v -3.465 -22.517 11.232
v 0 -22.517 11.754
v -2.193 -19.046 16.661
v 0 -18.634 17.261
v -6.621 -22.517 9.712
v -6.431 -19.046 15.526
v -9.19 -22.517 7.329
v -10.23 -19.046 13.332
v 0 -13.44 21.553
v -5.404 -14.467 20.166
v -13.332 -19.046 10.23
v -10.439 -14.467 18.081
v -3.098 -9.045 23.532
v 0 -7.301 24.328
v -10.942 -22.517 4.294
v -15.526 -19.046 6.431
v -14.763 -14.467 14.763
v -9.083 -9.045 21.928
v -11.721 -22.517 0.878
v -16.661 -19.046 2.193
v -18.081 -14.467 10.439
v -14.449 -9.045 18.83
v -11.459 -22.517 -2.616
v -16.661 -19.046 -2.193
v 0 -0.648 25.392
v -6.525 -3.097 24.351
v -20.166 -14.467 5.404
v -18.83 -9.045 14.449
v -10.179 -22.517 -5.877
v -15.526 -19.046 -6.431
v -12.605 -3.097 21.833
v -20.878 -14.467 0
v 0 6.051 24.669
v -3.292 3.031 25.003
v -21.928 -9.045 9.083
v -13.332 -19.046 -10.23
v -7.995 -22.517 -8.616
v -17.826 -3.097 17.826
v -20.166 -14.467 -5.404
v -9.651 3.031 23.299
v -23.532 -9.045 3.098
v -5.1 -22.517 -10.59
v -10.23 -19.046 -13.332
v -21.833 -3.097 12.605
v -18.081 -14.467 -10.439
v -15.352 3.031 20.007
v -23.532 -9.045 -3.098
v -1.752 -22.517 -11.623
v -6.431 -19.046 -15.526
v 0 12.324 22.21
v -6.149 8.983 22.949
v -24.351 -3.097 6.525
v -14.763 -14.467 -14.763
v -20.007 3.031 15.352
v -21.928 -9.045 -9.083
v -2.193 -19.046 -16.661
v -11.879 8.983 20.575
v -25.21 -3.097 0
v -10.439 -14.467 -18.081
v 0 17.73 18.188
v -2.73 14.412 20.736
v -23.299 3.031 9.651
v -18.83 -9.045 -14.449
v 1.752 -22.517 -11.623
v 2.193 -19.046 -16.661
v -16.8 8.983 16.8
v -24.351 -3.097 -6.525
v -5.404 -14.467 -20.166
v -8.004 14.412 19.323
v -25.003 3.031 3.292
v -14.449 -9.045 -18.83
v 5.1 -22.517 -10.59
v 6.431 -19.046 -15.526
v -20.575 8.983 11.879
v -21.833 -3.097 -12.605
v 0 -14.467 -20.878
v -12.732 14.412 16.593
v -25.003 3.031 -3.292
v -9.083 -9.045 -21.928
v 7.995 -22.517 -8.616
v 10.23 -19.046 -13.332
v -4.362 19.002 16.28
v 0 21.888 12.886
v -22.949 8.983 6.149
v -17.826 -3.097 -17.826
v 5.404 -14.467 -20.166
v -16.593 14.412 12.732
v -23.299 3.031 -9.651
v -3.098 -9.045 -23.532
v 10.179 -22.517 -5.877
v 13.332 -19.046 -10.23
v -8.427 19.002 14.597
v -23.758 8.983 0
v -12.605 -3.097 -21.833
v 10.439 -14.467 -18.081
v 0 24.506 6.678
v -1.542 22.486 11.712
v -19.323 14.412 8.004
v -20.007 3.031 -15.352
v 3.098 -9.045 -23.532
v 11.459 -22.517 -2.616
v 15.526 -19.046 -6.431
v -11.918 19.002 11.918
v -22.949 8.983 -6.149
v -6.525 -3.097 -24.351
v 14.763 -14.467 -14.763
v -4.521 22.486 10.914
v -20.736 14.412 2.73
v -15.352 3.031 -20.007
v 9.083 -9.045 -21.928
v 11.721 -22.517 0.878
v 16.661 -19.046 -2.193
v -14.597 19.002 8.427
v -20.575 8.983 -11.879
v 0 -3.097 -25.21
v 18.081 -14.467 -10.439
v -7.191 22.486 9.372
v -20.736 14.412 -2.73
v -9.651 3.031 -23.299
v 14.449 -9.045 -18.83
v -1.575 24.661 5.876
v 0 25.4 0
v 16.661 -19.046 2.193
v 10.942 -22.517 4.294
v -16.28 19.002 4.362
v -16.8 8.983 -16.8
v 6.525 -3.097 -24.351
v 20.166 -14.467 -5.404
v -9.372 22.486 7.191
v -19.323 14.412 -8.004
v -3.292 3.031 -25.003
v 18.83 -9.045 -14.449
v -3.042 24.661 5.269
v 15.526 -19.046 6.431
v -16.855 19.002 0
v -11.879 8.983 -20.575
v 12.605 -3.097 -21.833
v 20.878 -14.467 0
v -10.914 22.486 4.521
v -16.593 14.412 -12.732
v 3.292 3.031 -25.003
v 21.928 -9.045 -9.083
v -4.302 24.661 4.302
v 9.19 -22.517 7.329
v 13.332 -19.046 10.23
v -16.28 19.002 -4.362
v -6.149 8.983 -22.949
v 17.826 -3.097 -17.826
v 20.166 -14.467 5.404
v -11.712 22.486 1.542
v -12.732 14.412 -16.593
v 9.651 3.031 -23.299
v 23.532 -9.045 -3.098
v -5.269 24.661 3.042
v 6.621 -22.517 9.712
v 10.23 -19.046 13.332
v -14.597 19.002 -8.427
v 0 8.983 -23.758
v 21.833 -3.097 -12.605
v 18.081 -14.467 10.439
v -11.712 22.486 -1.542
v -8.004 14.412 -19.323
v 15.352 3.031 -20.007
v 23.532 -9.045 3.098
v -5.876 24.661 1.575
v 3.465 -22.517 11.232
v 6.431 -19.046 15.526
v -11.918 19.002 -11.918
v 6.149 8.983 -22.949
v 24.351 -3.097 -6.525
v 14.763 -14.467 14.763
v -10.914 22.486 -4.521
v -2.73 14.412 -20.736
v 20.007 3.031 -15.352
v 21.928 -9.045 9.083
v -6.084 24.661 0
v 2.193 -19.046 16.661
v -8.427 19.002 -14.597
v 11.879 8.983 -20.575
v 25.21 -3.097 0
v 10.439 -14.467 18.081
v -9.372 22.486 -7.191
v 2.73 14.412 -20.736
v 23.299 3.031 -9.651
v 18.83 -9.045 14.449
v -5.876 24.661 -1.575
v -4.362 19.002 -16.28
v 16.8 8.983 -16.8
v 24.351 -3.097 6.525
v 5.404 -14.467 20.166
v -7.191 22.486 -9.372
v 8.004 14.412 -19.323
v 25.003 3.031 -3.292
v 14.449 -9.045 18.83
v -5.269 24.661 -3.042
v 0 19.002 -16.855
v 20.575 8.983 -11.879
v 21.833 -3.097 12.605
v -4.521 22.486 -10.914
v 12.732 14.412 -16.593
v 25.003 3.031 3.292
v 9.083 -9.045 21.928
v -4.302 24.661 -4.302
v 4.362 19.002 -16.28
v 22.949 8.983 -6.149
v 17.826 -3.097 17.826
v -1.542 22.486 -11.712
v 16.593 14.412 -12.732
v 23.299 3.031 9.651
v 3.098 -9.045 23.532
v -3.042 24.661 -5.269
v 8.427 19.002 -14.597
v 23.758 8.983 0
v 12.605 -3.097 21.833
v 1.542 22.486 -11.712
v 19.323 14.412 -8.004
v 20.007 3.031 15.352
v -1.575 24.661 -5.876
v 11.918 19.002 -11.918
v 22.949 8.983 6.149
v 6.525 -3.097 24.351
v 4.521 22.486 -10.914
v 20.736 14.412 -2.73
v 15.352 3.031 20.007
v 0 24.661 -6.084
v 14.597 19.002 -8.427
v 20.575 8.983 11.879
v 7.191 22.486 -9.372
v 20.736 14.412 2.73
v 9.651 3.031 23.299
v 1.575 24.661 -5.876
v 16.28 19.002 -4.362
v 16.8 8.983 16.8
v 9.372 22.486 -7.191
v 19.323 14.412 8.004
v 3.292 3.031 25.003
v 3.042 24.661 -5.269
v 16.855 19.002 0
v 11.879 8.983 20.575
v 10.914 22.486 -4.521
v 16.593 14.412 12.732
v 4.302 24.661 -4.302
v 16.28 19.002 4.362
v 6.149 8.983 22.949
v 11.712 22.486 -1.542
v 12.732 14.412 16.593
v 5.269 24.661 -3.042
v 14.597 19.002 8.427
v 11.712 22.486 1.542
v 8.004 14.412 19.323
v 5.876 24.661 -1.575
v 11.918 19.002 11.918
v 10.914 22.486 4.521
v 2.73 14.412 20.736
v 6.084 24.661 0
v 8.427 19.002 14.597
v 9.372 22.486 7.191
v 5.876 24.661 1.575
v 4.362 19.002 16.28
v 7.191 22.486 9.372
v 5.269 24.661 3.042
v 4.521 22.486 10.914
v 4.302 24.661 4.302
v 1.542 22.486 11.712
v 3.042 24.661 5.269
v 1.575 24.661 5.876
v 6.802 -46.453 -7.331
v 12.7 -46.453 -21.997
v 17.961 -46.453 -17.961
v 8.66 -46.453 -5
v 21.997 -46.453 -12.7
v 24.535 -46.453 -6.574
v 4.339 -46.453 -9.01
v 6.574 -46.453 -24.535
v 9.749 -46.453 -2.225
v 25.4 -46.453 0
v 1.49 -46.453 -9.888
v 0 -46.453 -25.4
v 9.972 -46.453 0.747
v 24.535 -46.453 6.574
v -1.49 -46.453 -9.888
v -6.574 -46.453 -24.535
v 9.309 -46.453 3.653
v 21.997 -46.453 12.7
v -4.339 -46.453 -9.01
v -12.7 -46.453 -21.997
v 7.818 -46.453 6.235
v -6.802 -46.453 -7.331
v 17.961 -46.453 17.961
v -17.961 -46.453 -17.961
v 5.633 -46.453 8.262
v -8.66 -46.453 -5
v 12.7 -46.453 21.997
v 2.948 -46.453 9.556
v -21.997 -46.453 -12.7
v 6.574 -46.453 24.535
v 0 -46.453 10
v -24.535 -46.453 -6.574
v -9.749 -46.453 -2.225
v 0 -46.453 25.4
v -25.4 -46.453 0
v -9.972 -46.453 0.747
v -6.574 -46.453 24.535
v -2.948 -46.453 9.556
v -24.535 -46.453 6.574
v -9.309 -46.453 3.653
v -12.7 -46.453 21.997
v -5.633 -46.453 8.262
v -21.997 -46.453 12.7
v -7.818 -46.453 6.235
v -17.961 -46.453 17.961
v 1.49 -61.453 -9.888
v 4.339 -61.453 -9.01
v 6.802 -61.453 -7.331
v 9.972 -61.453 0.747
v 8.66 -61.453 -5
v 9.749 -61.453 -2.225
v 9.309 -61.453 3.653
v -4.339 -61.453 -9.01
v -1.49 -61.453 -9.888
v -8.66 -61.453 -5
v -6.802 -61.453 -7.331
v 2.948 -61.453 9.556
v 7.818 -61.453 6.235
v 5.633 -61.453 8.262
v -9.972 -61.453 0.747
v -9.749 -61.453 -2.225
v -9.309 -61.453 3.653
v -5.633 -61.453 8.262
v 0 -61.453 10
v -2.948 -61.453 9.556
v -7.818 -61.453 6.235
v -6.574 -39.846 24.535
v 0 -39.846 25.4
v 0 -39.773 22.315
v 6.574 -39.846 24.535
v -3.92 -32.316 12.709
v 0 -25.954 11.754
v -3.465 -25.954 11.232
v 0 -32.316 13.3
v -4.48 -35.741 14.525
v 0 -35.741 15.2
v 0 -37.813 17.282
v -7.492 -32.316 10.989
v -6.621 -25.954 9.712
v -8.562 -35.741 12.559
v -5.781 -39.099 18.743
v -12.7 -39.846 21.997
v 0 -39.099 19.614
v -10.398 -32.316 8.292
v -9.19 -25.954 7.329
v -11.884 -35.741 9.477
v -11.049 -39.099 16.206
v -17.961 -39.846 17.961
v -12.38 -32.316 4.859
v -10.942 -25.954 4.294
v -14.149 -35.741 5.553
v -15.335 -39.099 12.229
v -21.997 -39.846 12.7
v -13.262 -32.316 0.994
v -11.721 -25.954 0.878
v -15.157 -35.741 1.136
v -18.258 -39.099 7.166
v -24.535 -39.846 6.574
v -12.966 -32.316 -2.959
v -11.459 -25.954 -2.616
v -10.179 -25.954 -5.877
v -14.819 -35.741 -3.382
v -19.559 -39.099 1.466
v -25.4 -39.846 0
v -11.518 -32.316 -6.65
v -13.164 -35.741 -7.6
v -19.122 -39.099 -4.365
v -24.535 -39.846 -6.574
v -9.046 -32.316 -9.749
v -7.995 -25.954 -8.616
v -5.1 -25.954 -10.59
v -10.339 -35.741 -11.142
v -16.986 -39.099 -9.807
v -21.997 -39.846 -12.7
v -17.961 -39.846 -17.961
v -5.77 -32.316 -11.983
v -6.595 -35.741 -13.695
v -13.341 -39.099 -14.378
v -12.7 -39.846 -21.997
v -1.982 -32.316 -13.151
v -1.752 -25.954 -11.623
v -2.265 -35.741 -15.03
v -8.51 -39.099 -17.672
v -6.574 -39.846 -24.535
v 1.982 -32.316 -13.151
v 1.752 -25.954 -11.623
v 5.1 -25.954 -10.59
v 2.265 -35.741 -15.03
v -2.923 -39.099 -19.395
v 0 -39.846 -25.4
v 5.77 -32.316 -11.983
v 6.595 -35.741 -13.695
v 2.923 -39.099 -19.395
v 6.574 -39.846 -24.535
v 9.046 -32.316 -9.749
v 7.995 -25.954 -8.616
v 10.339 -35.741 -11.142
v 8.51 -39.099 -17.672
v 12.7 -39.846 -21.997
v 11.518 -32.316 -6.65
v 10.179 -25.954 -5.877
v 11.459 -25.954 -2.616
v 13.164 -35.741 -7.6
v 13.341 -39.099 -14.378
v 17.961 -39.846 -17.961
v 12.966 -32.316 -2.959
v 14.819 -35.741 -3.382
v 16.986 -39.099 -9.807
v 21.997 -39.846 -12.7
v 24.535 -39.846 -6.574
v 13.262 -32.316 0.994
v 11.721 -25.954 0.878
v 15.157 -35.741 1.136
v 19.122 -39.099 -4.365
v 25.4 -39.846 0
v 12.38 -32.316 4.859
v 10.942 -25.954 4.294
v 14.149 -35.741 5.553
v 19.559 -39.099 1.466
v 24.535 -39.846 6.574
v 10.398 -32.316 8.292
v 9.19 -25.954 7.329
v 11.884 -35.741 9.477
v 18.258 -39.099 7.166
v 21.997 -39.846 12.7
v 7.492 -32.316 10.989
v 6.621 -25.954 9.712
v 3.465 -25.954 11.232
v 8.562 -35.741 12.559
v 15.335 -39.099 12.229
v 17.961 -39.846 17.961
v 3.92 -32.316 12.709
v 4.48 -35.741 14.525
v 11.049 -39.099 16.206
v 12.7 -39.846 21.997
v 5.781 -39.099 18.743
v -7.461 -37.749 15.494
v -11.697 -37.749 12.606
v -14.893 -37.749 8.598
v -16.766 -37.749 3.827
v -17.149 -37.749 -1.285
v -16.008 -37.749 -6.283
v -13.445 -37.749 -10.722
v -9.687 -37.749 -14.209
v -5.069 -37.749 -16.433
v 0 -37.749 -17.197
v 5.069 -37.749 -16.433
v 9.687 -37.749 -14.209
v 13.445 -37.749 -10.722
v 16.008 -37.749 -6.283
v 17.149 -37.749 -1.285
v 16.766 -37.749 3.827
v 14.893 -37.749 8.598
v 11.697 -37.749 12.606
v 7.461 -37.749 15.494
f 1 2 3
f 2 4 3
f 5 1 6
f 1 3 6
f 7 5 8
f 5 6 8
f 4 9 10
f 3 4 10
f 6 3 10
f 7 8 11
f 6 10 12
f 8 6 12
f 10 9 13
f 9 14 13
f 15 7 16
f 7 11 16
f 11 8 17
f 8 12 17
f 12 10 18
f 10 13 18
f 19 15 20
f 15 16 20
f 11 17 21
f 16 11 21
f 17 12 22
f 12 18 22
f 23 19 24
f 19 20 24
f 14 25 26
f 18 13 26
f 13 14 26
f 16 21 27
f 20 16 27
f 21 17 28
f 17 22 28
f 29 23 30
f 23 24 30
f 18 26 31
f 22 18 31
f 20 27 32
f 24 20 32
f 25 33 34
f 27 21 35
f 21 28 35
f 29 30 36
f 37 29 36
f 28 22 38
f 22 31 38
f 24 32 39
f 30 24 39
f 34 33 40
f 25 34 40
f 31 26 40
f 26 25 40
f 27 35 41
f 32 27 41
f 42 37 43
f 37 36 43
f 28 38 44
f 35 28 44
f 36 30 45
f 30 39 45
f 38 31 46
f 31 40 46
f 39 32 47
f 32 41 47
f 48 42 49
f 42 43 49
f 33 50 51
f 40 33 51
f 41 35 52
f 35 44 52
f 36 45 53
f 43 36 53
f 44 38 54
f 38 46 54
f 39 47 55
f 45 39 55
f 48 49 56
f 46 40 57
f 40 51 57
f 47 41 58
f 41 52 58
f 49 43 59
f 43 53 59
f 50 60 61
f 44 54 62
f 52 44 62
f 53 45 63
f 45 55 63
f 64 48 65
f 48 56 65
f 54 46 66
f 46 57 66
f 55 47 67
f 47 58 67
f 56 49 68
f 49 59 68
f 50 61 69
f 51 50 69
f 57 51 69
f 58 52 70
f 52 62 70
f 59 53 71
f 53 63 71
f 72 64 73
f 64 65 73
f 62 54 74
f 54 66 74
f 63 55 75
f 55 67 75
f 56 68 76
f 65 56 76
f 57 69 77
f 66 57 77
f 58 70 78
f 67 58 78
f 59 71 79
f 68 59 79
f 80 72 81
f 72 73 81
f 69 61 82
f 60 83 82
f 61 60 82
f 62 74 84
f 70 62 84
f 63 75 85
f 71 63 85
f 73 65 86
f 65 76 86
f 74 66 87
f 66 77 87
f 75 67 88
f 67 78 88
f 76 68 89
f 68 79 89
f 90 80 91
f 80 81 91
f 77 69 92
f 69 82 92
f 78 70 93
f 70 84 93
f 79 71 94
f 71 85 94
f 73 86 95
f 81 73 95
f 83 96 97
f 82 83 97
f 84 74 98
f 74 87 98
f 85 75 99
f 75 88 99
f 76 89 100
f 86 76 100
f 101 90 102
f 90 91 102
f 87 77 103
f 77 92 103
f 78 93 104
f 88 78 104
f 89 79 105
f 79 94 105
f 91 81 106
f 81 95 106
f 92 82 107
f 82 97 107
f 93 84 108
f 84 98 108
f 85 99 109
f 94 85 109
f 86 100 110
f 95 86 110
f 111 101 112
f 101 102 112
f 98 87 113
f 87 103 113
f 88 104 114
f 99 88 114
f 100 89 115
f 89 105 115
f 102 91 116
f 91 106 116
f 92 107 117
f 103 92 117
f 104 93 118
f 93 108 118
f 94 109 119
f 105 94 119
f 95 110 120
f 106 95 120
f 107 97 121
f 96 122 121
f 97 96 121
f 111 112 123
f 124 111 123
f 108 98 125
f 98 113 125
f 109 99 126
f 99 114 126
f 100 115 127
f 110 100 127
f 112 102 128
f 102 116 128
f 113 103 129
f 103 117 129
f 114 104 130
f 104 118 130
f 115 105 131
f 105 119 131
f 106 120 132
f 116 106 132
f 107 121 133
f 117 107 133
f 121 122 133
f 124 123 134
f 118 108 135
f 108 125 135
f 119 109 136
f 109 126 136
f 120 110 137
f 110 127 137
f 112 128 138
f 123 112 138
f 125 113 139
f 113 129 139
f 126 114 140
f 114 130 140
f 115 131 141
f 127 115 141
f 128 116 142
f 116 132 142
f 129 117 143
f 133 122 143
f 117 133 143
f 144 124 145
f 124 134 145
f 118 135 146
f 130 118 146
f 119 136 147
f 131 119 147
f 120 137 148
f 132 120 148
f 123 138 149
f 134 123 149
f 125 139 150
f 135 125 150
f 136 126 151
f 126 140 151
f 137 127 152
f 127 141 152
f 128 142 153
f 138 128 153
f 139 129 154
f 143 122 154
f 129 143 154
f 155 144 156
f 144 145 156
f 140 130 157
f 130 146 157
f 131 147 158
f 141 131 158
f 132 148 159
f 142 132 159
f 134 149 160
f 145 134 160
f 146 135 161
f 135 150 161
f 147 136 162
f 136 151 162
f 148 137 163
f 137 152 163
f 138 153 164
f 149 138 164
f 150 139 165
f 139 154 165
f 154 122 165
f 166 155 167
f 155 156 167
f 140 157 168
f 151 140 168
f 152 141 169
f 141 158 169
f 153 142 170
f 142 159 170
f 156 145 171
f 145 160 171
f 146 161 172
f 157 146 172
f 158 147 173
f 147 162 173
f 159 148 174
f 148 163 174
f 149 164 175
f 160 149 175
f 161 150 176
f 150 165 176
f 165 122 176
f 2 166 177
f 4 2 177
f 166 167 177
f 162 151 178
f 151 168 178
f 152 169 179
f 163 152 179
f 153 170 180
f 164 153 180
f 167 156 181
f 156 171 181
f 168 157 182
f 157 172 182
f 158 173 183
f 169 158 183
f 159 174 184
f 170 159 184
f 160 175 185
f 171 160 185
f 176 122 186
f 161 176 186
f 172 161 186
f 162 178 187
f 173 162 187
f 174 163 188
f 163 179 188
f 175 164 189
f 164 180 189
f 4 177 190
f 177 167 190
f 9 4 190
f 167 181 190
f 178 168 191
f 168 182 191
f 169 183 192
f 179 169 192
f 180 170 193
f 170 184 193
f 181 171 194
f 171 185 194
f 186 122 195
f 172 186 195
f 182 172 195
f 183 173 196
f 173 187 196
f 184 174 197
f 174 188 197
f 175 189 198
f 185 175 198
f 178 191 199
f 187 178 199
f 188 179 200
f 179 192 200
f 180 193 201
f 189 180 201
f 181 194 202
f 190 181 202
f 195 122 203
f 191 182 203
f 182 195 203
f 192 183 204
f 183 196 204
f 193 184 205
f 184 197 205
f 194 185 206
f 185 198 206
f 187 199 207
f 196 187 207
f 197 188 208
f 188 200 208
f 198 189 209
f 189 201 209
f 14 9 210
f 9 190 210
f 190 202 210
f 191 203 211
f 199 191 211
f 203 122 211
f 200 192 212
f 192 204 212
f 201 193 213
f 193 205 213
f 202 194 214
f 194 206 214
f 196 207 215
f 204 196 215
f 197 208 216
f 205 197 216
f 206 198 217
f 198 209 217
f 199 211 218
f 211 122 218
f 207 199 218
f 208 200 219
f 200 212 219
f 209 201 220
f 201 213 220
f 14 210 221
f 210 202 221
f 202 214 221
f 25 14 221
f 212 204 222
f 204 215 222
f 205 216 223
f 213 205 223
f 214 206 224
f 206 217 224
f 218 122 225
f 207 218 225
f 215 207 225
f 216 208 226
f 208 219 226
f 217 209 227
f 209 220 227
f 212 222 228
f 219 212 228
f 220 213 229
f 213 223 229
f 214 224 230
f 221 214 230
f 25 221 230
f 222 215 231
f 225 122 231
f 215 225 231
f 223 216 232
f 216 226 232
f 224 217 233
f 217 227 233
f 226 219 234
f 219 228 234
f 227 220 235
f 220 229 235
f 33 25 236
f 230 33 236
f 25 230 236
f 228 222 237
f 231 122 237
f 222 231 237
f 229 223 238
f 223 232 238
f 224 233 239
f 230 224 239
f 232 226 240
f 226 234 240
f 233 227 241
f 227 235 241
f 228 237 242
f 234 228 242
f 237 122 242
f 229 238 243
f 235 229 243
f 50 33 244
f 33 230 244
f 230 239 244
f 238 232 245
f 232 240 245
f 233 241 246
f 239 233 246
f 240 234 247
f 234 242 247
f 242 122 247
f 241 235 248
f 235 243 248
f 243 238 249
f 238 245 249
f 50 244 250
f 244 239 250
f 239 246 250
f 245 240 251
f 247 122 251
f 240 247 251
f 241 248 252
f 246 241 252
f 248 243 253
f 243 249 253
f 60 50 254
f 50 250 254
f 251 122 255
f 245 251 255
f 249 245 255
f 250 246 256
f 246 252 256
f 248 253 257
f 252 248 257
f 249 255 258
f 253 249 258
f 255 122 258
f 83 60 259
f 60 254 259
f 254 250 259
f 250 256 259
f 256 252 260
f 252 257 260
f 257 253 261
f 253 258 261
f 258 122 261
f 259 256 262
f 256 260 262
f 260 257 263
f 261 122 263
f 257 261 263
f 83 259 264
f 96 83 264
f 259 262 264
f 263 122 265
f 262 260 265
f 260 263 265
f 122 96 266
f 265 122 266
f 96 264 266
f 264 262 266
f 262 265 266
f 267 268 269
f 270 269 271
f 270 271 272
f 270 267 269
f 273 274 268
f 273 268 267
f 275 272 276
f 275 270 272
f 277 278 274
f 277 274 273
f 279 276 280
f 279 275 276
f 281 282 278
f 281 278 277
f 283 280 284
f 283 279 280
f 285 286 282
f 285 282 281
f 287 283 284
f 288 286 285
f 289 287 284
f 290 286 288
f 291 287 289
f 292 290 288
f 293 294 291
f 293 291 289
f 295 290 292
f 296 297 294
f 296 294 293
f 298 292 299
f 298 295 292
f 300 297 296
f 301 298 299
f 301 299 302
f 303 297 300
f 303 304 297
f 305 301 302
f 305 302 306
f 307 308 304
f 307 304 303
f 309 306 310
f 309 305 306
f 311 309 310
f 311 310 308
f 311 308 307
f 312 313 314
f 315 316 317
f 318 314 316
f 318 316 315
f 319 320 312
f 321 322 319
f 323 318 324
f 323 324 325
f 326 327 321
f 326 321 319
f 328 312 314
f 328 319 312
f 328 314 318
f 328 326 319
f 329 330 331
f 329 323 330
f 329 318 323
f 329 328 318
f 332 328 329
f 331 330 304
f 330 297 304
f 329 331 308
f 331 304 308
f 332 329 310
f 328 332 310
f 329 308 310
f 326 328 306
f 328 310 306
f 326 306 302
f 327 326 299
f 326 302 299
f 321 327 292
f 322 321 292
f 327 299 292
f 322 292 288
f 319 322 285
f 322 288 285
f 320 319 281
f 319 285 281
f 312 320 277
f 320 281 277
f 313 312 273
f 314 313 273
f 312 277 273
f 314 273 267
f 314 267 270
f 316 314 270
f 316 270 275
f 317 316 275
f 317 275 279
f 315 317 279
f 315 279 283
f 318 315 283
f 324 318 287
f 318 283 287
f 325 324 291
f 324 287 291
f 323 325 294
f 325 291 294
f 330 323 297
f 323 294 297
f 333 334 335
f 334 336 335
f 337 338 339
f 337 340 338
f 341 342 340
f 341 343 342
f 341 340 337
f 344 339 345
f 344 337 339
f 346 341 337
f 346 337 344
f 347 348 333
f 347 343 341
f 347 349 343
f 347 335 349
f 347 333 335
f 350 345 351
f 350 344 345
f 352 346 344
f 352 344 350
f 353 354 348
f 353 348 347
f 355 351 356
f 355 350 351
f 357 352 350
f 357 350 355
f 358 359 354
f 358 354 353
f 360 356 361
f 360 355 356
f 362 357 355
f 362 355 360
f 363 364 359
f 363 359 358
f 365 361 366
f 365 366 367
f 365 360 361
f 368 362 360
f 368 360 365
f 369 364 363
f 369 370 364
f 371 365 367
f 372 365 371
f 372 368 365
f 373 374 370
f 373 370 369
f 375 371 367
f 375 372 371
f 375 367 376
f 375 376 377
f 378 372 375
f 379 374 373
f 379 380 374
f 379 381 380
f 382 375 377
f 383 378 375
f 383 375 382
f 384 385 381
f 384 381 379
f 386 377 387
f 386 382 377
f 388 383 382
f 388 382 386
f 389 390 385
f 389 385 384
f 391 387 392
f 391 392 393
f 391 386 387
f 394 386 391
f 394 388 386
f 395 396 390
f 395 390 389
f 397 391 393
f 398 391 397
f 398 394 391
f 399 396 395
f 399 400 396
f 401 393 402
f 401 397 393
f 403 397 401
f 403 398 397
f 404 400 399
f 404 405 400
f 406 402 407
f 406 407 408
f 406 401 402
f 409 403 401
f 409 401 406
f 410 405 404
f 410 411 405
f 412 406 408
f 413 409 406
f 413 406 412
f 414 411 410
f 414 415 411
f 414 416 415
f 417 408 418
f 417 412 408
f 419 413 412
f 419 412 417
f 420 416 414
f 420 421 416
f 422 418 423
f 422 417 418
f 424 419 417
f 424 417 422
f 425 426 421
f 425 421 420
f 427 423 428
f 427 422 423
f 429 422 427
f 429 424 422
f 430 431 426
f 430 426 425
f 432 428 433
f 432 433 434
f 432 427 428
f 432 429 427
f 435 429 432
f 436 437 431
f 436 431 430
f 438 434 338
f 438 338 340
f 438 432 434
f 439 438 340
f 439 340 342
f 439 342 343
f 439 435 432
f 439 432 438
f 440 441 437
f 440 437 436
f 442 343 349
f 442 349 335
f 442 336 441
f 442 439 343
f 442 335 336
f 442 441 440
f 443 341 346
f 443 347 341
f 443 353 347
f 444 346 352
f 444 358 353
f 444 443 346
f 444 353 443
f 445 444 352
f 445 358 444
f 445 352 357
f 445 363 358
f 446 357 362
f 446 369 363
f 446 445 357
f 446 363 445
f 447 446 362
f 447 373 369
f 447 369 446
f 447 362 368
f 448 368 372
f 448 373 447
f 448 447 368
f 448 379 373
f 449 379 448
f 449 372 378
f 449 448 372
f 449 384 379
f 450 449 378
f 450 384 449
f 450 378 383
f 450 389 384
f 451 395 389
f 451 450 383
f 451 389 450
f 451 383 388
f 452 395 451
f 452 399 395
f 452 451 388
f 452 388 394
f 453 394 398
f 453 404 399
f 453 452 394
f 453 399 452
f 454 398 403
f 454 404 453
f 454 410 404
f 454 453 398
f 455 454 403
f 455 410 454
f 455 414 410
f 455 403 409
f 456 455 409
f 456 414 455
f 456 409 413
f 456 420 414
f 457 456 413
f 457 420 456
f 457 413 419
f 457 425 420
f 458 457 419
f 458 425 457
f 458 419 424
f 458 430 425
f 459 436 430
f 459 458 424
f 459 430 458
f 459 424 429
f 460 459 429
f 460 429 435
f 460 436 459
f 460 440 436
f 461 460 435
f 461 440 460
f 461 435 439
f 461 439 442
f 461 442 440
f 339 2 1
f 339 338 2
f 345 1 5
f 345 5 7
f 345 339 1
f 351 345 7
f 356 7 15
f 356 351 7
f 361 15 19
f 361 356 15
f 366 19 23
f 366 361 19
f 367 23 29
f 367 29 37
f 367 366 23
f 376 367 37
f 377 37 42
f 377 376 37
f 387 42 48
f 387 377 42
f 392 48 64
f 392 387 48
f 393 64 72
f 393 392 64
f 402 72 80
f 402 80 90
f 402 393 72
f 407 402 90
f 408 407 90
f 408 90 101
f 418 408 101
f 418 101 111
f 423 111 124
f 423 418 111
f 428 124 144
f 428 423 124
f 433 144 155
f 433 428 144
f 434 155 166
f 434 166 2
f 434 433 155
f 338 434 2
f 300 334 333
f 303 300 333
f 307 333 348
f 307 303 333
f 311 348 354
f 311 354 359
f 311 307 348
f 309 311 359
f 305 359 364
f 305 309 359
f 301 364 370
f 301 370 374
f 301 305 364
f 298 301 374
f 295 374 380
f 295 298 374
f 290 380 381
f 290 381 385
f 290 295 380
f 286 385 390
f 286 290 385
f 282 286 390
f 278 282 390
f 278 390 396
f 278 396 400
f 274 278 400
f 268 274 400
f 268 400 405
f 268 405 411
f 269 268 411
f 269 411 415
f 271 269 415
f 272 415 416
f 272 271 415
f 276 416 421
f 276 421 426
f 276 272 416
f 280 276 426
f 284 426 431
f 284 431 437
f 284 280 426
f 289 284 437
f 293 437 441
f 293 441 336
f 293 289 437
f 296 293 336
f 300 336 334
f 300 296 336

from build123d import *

# Parameters (mm, degrees)
SKETCH1_W = 10
SKETCH1_H = 15


with BuildPart() as part:
    # Sketch1 → Revolve2 (revolve)
    with BuildSketch(Plane(origin=(0, 0, 0), x_dir=(0, 0, -1), z_dir=(1, 0, 0))):
        with BuildLine():
            Line((0, 25.4), (0, -25.4))
            ThreePointArc((0, -25.4), (-25.4, 0), (0, 25.4))
        make_face()
        with BuildLine():
            Line((0, -46.453146802), (0, -25.4))
            ThreePointArc((0, -25.4), (-6.051284035, -24.668643285), (-11.754091911, -22.516689884))
            Line((-11.754091911, -22.516689884), (-11.754091911, -25.953962773))
            add(Edge.make_bspline(
                [(-11.754091911, -25.953962773), (-13.625124372, -40.663791469), (-25.4, -39.846348213)],
                knots=[0, 0, 0, 1, 1, 1], degree=2))
            Line((-25.4, -39.846348213), (-25.4, -46.453146802))
            Line((-25.4, -46.453146802), (-10, -46.453146802))
            Line((-10, -46.453146802), (0, -46.453146802))
        make_face()
        with Locations((-5, -53.953146802)):
            Rectangle(SKETCH1_W, SKETCH1_H)
    revolve(axis=Axis((0, 38.955963628, 0), (0, -1, 0)))


solid = part.part
